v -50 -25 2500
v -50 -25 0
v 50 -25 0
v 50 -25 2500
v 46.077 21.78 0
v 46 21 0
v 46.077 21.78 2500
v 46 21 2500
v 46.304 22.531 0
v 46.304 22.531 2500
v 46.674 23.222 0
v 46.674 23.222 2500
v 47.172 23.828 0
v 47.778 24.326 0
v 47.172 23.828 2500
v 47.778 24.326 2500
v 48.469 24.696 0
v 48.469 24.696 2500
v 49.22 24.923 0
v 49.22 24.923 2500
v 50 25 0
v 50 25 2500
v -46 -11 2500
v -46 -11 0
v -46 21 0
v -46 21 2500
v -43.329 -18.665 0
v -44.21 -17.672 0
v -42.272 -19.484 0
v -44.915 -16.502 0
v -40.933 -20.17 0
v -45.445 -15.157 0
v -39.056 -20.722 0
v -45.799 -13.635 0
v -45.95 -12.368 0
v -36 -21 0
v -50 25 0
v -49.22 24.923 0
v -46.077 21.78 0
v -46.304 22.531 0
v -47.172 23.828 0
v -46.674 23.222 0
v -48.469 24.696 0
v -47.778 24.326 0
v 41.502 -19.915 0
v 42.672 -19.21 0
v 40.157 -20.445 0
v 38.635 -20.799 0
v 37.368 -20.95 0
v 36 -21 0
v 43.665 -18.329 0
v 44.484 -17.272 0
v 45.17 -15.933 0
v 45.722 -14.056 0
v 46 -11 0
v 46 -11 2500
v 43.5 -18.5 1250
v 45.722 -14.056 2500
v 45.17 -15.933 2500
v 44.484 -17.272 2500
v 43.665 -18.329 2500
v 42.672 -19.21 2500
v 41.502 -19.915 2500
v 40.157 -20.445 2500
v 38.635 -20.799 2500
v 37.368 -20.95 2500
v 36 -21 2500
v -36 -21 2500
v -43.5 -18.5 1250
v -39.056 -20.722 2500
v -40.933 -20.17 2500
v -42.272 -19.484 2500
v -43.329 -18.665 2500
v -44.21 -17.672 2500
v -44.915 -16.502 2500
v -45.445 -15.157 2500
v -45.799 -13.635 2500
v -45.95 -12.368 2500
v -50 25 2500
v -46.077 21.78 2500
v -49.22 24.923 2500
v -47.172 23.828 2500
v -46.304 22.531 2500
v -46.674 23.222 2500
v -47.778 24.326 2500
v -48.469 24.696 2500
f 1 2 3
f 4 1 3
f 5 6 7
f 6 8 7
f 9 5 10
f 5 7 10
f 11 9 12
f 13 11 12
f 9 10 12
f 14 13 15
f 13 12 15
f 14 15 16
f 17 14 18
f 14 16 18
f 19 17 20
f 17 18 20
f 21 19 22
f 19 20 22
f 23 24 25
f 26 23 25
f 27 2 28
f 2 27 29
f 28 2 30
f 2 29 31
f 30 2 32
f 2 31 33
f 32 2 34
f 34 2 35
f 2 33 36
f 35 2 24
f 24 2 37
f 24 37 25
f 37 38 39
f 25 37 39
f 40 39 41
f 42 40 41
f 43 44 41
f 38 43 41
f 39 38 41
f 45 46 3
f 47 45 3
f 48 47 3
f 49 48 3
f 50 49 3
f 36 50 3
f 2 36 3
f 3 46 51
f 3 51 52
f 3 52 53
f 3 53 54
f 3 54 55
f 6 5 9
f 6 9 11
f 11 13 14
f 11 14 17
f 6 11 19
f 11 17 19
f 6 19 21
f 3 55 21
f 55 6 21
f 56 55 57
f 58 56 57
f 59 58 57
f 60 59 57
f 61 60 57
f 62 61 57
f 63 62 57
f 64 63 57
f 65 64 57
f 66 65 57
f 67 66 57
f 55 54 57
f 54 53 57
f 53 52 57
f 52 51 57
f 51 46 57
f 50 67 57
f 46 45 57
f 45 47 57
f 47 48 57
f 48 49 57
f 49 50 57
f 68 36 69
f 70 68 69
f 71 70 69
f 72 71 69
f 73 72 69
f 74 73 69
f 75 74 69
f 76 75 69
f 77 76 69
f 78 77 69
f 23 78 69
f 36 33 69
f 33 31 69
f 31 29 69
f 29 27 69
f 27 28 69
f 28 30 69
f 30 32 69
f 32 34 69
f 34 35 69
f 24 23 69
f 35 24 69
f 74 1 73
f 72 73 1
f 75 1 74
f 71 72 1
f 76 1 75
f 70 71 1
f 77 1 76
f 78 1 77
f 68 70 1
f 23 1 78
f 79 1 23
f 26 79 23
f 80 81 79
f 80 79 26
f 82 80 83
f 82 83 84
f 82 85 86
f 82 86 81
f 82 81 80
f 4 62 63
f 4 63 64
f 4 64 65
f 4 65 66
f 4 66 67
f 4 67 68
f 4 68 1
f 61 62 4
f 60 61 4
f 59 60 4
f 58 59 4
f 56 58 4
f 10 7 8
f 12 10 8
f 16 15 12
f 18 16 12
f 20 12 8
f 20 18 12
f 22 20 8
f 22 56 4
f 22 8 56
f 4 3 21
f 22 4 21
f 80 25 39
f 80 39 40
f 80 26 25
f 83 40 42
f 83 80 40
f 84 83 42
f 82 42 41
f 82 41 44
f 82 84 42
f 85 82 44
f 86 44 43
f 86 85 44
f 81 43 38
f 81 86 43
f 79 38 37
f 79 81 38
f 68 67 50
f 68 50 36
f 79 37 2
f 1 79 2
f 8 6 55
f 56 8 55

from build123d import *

# Parameters (mm, degrees)
F1_DEPTH    = 2500
F2_T1_DEPTH = 2500
F3_R        = 3.99999


# Not quite as in the source:
# - a fillet or chamfer that OpenCascade refuses, or shapes differently, is made with other operations: its cross-section is extruded or revolved along the edge and cut away or added
# - a fillet or chamfer is up to 0.001 mm smaller than in the source, because OpenCascade refuses the exact size


with BuildPart() as f1:
    # F0 (on Top) → F1 (new body)
    with BuildSketch(Plane.XY):
        Polygon((-50, -25), (50, -25), (50, 25), (46, 25), (46, -21), (-46, -21), (-46, 25), (-50, 25), align=None)
    extrude(amount=F1_DEPTH)

    # F2: fillet of radius 10 on 2 edges, made by hand

    # F2_s2 → F2_t1 (join)
    with BuildSketch(Plane.XY):
        with BuildLine():
            add(Edge.make_bspline(
                [(46, -11), (46, -21), (36, -21)],
                knots=[0, 0, 0, 1, 1, 1], degree=2, weights=[1, 1, 1]))
            Line((36, -21), (46, -21))
            Line((46, -21), (46, -11))
        make_face()
        with BuildLine():
            add(Edge.make_bspline(
                [(-36, -21), (-46, -21), (-46, -11)],
                knots=[0, 0, 0, 1, 1, 1], degree=2, weights=[1, 1, 1]))
            Line((-46, -11), (-46, -21))
            Line((-46, -21), (-36, -21))
        make_face()
    extrude(amount=F2_T1_DEPTH)

    # F3 (radius 4 in the source; OpenCascade refuses exactly that, so slightly less here)
    f3_edges = [f1.edges().sort_by_distance(p)[0] for p in [
        (-46, 25, 1250),
        (46, 25, 1250),
    ]]
    fillet(f3_edges, radius=F3_R)


solid = f1.part
